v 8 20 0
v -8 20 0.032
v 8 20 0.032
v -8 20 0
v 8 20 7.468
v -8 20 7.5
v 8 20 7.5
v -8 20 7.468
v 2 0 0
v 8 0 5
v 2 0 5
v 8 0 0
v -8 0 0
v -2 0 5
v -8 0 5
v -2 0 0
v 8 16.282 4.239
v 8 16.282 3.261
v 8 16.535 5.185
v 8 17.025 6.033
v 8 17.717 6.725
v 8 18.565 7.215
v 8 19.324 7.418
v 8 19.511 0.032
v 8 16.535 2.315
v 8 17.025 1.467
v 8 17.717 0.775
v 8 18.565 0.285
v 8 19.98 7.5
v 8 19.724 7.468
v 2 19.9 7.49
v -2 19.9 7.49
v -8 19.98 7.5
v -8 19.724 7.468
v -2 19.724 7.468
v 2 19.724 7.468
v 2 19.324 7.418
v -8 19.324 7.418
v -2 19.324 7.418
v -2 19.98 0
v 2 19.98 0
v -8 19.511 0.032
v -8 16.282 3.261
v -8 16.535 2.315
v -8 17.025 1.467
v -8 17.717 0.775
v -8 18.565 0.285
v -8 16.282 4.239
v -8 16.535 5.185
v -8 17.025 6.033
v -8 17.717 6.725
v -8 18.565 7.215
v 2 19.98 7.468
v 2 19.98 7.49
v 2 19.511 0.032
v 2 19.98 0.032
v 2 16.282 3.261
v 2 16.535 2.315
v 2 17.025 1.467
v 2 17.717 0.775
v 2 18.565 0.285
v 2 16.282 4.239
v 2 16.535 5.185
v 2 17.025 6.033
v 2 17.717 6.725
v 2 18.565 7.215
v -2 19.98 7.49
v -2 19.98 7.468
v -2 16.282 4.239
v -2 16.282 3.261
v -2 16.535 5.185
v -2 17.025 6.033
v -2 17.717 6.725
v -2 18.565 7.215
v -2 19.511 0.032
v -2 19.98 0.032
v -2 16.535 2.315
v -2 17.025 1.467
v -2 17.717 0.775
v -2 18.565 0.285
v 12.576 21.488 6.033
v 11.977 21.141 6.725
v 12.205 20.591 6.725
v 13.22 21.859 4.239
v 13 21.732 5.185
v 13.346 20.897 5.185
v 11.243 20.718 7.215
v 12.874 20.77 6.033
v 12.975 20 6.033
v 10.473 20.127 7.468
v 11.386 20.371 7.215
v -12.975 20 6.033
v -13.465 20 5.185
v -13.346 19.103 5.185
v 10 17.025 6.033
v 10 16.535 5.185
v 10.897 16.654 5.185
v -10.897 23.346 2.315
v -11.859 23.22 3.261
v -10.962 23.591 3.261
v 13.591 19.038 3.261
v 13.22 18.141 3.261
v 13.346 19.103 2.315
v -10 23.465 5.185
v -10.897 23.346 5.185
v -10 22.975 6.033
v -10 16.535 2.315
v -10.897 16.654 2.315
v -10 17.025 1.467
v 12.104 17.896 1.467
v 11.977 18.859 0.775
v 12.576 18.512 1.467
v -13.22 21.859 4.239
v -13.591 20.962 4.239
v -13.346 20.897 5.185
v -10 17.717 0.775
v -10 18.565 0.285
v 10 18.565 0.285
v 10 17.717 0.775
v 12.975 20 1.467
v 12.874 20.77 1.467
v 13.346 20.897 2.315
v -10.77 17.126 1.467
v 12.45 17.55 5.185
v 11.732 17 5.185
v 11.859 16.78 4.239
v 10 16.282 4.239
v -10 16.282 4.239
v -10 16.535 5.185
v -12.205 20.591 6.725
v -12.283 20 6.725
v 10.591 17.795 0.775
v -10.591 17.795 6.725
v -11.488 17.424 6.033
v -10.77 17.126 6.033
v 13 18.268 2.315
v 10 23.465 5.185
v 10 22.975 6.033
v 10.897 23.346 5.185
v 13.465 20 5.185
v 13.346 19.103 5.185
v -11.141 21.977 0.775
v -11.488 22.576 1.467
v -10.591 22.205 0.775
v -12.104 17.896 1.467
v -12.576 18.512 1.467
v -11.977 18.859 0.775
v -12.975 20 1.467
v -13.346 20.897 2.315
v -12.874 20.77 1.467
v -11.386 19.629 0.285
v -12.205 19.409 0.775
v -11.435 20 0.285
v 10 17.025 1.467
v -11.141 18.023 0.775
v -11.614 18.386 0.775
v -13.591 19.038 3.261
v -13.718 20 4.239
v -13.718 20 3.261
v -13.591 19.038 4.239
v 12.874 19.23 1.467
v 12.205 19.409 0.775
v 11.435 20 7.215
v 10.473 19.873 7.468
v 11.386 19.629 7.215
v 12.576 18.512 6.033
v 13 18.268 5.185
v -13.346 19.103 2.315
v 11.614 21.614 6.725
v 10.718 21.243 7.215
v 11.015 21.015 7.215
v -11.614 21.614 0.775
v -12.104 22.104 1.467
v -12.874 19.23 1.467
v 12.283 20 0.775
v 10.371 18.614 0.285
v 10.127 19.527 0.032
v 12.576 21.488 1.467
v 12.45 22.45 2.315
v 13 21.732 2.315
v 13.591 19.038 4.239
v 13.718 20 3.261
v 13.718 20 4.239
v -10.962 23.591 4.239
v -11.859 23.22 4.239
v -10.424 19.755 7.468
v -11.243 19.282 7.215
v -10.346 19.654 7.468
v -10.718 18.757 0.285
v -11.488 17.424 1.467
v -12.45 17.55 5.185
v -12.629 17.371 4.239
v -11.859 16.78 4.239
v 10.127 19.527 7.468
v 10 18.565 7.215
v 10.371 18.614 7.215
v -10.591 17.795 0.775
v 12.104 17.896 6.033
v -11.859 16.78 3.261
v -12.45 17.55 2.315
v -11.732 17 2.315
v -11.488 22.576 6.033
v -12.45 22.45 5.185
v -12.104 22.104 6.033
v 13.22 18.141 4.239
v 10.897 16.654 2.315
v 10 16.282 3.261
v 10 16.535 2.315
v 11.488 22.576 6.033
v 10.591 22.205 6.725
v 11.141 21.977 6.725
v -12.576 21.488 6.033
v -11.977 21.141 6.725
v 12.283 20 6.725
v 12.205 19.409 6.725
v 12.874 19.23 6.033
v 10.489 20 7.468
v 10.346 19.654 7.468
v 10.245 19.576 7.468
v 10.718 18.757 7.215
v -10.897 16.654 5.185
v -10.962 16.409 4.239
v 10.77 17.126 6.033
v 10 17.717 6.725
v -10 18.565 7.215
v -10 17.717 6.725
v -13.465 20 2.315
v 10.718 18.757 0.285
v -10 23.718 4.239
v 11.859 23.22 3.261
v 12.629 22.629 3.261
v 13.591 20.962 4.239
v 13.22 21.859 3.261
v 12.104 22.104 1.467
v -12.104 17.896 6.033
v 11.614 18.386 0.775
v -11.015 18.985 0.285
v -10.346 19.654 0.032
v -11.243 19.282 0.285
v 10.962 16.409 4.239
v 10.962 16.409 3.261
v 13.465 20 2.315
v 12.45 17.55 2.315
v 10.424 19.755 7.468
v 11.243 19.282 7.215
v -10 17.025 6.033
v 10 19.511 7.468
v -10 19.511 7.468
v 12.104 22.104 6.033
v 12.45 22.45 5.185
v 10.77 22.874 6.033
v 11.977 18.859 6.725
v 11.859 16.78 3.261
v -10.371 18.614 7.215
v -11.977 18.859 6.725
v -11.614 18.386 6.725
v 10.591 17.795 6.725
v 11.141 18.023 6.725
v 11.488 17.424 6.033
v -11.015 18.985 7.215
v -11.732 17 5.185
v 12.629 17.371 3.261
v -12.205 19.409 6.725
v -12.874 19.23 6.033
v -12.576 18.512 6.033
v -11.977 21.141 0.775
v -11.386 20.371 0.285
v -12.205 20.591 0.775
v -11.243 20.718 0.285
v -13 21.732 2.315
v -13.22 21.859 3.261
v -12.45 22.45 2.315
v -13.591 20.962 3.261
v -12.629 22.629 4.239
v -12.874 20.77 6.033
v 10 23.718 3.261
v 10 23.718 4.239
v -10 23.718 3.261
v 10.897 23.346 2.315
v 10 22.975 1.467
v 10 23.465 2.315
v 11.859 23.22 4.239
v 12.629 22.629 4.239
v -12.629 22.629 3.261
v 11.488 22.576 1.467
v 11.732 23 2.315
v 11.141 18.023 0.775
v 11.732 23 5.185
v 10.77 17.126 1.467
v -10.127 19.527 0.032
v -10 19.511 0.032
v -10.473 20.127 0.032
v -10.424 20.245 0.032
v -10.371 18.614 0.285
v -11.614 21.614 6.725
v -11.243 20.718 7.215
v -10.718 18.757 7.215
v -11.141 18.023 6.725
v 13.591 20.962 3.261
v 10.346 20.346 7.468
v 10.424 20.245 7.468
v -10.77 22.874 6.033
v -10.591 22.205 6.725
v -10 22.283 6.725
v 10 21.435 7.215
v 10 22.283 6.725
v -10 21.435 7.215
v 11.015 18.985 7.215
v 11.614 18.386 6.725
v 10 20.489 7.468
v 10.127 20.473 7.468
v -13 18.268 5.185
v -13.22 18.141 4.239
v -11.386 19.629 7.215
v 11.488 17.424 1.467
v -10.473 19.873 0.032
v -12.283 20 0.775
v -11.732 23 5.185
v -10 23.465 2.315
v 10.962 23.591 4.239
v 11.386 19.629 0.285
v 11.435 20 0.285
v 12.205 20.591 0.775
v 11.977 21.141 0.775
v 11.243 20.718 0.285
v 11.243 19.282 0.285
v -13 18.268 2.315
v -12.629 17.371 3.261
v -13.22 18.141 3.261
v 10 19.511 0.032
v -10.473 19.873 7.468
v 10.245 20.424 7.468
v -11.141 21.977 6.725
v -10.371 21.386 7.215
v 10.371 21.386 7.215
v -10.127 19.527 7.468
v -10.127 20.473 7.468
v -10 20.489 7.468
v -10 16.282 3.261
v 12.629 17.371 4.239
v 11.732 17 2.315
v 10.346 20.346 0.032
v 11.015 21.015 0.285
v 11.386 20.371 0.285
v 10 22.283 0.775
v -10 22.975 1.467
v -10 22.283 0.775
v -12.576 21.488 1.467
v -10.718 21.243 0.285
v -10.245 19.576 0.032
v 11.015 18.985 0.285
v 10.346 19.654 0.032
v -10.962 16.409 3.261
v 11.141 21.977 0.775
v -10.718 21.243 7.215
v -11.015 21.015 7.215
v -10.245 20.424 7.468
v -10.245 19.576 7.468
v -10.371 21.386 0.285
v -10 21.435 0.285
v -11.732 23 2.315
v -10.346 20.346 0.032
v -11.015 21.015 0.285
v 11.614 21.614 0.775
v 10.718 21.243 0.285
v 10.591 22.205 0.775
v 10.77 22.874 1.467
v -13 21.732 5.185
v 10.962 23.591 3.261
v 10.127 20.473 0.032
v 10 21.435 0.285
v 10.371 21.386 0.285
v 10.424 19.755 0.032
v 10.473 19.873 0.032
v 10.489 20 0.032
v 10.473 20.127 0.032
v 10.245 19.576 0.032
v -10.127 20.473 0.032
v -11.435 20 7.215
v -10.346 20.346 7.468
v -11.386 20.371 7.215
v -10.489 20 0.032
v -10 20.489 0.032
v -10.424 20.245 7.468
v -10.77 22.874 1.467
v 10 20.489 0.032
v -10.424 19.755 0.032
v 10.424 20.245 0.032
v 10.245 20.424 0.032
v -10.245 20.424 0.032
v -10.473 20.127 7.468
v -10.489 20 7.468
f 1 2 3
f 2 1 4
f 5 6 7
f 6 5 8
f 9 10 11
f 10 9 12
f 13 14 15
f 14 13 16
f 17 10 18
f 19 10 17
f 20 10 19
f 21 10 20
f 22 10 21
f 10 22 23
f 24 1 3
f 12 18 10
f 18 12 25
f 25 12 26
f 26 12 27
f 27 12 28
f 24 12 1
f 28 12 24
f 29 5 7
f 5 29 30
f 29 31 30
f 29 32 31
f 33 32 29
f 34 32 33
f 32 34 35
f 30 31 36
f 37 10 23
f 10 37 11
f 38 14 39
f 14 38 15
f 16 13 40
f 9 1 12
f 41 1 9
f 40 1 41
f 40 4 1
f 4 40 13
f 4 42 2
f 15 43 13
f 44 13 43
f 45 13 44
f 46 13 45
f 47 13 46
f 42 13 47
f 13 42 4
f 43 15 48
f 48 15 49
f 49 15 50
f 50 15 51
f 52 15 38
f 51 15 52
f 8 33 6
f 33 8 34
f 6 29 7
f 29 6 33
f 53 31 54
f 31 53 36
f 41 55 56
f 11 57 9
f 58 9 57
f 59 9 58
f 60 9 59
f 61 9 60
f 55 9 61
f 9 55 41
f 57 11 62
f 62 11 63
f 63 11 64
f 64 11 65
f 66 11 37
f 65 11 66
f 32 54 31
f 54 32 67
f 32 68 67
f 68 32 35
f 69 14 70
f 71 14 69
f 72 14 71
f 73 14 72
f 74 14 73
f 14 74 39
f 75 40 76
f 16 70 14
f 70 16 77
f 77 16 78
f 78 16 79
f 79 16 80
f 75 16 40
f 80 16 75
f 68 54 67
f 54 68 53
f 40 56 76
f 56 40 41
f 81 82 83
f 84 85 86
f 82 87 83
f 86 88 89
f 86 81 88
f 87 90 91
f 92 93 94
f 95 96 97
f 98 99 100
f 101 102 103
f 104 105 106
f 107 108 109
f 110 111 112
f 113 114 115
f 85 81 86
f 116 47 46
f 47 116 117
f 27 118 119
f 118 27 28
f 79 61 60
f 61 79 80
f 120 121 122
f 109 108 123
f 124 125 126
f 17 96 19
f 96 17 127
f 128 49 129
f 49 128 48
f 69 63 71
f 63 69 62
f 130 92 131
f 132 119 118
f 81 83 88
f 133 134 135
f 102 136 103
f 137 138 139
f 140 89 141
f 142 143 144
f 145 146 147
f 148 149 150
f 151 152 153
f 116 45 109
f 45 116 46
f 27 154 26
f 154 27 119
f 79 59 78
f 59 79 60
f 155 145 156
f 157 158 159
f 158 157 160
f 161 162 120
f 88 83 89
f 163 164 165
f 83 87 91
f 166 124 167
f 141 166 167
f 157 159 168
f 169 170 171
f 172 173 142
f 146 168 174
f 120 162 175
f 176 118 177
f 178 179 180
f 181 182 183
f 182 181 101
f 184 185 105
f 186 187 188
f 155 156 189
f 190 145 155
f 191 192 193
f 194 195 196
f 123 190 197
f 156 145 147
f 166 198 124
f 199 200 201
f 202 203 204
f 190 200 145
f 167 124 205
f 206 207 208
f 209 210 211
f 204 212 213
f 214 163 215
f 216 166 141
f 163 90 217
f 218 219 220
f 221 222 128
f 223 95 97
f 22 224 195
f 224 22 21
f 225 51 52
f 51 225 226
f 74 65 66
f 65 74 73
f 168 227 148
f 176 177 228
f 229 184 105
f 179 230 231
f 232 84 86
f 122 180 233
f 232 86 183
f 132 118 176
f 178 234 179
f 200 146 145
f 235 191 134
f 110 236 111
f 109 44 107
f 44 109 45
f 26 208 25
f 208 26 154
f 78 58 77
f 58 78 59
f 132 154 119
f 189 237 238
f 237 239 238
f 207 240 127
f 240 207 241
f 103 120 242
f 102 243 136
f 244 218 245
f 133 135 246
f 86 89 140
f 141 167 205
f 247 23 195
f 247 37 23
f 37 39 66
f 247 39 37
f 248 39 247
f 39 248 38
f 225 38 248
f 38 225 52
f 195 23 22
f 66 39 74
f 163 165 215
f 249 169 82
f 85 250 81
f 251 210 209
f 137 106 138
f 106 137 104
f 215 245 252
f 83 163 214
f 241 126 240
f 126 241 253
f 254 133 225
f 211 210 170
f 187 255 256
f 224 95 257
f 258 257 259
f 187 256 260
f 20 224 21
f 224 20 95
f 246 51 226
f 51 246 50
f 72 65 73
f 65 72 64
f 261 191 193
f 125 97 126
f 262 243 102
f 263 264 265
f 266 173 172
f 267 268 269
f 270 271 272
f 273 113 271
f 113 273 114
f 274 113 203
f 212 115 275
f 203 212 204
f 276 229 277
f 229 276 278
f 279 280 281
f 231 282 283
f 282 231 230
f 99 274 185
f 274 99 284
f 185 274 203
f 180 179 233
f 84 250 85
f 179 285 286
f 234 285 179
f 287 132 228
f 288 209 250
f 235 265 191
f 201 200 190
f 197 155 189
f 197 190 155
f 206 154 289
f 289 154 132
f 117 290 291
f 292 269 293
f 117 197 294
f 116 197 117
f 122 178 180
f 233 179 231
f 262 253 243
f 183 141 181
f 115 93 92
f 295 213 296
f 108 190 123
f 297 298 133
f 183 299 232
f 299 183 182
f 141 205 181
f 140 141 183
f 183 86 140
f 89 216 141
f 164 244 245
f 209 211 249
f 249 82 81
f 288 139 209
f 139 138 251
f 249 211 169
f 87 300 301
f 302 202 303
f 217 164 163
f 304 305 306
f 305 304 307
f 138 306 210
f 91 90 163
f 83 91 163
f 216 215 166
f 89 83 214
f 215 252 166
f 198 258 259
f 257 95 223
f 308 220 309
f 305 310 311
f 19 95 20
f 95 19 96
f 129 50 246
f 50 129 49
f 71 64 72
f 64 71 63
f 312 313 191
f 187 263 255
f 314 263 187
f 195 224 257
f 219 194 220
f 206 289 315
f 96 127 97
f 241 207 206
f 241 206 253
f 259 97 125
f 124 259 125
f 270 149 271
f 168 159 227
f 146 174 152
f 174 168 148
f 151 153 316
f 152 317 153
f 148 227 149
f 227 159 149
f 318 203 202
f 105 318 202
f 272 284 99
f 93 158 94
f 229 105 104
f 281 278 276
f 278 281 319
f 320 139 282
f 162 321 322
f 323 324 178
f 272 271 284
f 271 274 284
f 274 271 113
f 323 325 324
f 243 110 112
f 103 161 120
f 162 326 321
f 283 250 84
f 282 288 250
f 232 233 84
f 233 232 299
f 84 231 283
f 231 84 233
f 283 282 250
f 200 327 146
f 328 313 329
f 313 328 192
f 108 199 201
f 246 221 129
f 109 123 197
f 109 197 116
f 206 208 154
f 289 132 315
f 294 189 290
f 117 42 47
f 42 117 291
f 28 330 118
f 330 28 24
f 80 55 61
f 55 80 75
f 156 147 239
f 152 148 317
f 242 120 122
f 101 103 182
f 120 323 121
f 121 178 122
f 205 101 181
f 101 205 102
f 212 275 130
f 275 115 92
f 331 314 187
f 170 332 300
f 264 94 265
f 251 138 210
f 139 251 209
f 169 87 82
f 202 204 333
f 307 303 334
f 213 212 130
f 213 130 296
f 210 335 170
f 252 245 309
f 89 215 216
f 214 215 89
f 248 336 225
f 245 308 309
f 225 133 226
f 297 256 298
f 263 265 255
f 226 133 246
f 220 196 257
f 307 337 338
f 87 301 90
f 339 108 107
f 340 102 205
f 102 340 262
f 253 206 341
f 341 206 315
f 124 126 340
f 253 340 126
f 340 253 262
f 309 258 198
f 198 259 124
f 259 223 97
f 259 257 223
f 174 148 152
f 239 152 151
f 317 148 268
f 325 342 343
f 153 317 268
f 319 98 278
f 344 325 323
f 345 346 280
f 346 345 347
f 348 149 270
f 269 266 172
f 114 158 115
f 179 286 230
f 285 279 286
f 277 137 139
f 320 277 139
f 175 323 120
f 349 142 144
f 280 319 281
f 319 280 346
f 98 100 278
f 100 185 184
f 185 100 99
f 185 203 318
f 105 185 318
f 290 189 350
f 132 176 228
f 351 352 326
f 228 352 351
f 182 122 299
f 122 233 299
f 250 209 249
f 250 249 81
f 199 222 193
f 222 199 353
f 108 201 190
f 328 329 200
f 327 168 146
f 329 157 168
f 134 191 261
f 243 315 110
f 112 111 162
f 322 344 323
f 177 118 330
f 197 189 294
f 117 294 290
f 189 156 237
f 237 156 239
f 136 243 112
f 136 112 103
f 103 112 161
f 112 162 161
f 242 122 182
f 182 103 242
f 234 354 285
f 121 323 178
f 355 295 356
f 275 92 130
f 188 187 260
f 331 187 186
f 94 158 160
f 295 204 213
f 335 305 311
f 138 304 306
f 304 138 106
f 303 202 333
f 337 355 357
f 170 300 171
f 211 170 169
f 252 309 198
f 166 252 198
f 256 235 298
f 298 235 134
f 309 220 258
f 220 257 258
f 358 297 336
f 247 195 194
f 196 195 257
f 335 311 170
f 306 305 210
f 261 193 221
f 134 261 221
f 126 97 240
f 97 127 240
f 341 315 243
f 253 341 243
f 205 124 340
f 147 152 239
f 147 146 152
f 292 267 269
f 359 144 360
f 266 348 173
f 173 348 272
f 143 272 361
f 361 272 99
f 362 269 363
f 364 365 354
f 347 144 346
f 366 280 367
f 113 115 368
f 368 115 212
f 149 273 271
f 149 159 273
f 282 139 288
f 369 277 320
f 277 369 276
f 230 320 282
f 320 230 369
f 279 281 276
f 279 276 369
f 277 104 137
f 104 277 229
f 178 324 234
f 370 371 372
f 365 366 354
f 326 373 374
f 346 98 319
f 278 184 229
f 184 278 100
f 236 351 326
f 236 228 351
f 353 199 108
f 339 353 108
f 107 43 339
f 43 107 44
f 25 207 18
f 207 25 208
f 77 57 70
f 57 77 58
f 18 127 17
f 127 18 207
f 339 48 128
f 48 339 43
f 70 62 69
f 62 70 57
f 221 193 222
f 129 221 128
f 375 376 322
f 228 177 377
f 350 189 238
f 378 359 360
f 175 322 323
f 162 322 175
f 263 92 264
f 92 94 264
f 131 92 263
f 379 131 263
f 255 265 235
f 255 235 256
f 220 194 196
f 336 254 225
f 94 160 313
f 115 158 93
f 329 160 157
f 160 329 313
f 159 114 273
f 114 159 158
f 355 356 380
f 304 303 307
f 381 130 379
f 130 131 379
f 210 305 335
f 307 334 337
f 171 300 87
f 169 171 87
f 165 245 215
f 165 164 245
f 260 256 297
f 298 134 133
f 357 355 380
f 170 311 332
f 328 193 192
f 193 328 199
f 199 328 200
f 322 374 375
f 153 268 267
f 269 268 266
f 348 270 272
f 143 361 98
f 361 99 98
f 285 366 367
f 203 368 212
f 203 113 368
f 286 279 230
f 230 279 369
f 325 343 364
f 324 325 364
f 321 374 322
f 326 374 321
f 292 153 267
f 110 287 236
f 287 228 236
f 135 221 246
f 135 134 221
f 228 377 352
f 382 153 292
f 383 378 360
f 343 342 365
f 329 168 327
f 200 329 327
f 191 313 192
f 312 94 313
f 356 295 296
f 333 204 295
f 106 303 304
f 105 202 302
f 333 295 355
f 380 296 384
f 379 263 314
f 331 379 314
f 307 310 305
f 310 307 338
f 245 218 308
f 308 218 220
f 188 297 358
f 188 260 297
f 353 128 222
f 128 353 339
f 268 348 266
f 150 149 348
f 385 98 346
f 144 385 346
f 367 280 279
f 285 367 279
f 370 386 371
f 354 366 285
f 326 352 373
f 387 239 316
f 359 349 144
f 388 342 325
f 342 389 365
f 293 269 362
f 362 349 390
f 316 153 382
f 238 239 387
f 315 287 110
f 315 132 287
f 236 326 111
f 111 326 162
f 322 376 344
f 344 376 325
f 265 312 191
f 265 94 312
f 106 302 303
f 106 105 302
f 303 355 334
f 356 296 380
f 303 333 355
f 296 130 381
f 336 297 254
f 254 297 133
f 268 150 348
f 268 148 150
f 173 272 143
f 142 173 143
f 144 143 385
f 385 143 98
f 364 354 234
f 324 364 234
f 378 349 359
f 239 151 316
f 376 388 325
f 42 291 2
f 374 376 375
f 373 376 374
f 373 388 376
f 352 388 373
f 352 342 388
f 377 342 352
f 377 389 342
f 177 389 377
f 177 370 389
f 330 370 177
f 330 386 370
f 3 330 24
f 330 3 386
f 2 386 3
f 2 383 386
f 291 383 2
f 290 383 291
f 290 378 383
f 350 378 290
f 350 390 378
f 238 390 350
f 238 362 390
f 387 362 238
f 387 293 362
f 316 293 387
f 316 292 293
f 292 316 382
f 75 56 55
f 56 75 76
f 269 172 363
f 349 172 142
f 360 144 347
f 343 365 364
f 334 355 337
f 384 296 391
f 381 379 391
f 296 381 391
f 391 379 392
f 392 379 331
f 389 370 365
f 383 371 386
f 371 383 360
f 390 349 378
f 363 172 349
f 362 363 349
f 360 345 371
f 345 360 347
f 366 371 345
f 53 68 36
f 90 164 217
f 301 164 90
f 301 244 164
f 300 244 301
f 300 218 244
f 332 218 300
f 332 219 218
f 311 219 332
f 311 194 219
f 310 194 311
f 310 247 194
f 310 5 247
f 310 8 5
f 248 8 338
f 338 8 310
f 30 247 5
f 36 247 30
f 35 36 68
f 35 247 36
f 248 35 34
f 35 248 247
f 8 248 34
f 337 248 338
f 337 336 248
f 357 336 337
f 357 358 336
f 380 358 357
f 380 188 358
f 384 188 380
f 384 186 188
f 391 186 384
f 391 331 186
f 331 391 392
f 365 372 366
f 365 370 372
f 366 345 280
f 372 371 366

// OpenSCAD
// Total width
handleWidth=20;
// Individual arm width
armWidth=6;
// Arm length
armLength=20;
// Arm smaller height (in the frame)
armHeight1=5.0;
// Arm outer height (near the handle)
armHeight2=7.5;

// Ultimaker Extruder/Feeder locking key
// jeremie.francois@gmail.com / MoonCactus on thingiverse / www.tridimake.com
// Rev B: compatible with the customizer for other geometries

handleDiameter= armHeight2;

tol=0.02+0;

armGap=16-armWidth*2;
$fa=1;
$fs=1;
module arm()
{
	translate([-(armWidth+armGap+armWidth)/2,0,0])
	difference()
	{
		hull()
		{
			cube([armWidth+armGap+armWidth,tol,armHeight1]);
			translate([0,armLength-tol,0])
				cube([armWidth+armGap+armWidth,tol,armHeight2]);
		}
		translate([armWidth,-tol,-tol])
			cube([armGap,armLength,armHeight2+0.01]);
	}
	hull()
	{
		for(s=[-1,+1]) scale([s,1,1])
		translate([-handleWidth/2, armLength, handleDiameter/2]) sphere(r=handleDiameter/2);
	}
}

arm();
